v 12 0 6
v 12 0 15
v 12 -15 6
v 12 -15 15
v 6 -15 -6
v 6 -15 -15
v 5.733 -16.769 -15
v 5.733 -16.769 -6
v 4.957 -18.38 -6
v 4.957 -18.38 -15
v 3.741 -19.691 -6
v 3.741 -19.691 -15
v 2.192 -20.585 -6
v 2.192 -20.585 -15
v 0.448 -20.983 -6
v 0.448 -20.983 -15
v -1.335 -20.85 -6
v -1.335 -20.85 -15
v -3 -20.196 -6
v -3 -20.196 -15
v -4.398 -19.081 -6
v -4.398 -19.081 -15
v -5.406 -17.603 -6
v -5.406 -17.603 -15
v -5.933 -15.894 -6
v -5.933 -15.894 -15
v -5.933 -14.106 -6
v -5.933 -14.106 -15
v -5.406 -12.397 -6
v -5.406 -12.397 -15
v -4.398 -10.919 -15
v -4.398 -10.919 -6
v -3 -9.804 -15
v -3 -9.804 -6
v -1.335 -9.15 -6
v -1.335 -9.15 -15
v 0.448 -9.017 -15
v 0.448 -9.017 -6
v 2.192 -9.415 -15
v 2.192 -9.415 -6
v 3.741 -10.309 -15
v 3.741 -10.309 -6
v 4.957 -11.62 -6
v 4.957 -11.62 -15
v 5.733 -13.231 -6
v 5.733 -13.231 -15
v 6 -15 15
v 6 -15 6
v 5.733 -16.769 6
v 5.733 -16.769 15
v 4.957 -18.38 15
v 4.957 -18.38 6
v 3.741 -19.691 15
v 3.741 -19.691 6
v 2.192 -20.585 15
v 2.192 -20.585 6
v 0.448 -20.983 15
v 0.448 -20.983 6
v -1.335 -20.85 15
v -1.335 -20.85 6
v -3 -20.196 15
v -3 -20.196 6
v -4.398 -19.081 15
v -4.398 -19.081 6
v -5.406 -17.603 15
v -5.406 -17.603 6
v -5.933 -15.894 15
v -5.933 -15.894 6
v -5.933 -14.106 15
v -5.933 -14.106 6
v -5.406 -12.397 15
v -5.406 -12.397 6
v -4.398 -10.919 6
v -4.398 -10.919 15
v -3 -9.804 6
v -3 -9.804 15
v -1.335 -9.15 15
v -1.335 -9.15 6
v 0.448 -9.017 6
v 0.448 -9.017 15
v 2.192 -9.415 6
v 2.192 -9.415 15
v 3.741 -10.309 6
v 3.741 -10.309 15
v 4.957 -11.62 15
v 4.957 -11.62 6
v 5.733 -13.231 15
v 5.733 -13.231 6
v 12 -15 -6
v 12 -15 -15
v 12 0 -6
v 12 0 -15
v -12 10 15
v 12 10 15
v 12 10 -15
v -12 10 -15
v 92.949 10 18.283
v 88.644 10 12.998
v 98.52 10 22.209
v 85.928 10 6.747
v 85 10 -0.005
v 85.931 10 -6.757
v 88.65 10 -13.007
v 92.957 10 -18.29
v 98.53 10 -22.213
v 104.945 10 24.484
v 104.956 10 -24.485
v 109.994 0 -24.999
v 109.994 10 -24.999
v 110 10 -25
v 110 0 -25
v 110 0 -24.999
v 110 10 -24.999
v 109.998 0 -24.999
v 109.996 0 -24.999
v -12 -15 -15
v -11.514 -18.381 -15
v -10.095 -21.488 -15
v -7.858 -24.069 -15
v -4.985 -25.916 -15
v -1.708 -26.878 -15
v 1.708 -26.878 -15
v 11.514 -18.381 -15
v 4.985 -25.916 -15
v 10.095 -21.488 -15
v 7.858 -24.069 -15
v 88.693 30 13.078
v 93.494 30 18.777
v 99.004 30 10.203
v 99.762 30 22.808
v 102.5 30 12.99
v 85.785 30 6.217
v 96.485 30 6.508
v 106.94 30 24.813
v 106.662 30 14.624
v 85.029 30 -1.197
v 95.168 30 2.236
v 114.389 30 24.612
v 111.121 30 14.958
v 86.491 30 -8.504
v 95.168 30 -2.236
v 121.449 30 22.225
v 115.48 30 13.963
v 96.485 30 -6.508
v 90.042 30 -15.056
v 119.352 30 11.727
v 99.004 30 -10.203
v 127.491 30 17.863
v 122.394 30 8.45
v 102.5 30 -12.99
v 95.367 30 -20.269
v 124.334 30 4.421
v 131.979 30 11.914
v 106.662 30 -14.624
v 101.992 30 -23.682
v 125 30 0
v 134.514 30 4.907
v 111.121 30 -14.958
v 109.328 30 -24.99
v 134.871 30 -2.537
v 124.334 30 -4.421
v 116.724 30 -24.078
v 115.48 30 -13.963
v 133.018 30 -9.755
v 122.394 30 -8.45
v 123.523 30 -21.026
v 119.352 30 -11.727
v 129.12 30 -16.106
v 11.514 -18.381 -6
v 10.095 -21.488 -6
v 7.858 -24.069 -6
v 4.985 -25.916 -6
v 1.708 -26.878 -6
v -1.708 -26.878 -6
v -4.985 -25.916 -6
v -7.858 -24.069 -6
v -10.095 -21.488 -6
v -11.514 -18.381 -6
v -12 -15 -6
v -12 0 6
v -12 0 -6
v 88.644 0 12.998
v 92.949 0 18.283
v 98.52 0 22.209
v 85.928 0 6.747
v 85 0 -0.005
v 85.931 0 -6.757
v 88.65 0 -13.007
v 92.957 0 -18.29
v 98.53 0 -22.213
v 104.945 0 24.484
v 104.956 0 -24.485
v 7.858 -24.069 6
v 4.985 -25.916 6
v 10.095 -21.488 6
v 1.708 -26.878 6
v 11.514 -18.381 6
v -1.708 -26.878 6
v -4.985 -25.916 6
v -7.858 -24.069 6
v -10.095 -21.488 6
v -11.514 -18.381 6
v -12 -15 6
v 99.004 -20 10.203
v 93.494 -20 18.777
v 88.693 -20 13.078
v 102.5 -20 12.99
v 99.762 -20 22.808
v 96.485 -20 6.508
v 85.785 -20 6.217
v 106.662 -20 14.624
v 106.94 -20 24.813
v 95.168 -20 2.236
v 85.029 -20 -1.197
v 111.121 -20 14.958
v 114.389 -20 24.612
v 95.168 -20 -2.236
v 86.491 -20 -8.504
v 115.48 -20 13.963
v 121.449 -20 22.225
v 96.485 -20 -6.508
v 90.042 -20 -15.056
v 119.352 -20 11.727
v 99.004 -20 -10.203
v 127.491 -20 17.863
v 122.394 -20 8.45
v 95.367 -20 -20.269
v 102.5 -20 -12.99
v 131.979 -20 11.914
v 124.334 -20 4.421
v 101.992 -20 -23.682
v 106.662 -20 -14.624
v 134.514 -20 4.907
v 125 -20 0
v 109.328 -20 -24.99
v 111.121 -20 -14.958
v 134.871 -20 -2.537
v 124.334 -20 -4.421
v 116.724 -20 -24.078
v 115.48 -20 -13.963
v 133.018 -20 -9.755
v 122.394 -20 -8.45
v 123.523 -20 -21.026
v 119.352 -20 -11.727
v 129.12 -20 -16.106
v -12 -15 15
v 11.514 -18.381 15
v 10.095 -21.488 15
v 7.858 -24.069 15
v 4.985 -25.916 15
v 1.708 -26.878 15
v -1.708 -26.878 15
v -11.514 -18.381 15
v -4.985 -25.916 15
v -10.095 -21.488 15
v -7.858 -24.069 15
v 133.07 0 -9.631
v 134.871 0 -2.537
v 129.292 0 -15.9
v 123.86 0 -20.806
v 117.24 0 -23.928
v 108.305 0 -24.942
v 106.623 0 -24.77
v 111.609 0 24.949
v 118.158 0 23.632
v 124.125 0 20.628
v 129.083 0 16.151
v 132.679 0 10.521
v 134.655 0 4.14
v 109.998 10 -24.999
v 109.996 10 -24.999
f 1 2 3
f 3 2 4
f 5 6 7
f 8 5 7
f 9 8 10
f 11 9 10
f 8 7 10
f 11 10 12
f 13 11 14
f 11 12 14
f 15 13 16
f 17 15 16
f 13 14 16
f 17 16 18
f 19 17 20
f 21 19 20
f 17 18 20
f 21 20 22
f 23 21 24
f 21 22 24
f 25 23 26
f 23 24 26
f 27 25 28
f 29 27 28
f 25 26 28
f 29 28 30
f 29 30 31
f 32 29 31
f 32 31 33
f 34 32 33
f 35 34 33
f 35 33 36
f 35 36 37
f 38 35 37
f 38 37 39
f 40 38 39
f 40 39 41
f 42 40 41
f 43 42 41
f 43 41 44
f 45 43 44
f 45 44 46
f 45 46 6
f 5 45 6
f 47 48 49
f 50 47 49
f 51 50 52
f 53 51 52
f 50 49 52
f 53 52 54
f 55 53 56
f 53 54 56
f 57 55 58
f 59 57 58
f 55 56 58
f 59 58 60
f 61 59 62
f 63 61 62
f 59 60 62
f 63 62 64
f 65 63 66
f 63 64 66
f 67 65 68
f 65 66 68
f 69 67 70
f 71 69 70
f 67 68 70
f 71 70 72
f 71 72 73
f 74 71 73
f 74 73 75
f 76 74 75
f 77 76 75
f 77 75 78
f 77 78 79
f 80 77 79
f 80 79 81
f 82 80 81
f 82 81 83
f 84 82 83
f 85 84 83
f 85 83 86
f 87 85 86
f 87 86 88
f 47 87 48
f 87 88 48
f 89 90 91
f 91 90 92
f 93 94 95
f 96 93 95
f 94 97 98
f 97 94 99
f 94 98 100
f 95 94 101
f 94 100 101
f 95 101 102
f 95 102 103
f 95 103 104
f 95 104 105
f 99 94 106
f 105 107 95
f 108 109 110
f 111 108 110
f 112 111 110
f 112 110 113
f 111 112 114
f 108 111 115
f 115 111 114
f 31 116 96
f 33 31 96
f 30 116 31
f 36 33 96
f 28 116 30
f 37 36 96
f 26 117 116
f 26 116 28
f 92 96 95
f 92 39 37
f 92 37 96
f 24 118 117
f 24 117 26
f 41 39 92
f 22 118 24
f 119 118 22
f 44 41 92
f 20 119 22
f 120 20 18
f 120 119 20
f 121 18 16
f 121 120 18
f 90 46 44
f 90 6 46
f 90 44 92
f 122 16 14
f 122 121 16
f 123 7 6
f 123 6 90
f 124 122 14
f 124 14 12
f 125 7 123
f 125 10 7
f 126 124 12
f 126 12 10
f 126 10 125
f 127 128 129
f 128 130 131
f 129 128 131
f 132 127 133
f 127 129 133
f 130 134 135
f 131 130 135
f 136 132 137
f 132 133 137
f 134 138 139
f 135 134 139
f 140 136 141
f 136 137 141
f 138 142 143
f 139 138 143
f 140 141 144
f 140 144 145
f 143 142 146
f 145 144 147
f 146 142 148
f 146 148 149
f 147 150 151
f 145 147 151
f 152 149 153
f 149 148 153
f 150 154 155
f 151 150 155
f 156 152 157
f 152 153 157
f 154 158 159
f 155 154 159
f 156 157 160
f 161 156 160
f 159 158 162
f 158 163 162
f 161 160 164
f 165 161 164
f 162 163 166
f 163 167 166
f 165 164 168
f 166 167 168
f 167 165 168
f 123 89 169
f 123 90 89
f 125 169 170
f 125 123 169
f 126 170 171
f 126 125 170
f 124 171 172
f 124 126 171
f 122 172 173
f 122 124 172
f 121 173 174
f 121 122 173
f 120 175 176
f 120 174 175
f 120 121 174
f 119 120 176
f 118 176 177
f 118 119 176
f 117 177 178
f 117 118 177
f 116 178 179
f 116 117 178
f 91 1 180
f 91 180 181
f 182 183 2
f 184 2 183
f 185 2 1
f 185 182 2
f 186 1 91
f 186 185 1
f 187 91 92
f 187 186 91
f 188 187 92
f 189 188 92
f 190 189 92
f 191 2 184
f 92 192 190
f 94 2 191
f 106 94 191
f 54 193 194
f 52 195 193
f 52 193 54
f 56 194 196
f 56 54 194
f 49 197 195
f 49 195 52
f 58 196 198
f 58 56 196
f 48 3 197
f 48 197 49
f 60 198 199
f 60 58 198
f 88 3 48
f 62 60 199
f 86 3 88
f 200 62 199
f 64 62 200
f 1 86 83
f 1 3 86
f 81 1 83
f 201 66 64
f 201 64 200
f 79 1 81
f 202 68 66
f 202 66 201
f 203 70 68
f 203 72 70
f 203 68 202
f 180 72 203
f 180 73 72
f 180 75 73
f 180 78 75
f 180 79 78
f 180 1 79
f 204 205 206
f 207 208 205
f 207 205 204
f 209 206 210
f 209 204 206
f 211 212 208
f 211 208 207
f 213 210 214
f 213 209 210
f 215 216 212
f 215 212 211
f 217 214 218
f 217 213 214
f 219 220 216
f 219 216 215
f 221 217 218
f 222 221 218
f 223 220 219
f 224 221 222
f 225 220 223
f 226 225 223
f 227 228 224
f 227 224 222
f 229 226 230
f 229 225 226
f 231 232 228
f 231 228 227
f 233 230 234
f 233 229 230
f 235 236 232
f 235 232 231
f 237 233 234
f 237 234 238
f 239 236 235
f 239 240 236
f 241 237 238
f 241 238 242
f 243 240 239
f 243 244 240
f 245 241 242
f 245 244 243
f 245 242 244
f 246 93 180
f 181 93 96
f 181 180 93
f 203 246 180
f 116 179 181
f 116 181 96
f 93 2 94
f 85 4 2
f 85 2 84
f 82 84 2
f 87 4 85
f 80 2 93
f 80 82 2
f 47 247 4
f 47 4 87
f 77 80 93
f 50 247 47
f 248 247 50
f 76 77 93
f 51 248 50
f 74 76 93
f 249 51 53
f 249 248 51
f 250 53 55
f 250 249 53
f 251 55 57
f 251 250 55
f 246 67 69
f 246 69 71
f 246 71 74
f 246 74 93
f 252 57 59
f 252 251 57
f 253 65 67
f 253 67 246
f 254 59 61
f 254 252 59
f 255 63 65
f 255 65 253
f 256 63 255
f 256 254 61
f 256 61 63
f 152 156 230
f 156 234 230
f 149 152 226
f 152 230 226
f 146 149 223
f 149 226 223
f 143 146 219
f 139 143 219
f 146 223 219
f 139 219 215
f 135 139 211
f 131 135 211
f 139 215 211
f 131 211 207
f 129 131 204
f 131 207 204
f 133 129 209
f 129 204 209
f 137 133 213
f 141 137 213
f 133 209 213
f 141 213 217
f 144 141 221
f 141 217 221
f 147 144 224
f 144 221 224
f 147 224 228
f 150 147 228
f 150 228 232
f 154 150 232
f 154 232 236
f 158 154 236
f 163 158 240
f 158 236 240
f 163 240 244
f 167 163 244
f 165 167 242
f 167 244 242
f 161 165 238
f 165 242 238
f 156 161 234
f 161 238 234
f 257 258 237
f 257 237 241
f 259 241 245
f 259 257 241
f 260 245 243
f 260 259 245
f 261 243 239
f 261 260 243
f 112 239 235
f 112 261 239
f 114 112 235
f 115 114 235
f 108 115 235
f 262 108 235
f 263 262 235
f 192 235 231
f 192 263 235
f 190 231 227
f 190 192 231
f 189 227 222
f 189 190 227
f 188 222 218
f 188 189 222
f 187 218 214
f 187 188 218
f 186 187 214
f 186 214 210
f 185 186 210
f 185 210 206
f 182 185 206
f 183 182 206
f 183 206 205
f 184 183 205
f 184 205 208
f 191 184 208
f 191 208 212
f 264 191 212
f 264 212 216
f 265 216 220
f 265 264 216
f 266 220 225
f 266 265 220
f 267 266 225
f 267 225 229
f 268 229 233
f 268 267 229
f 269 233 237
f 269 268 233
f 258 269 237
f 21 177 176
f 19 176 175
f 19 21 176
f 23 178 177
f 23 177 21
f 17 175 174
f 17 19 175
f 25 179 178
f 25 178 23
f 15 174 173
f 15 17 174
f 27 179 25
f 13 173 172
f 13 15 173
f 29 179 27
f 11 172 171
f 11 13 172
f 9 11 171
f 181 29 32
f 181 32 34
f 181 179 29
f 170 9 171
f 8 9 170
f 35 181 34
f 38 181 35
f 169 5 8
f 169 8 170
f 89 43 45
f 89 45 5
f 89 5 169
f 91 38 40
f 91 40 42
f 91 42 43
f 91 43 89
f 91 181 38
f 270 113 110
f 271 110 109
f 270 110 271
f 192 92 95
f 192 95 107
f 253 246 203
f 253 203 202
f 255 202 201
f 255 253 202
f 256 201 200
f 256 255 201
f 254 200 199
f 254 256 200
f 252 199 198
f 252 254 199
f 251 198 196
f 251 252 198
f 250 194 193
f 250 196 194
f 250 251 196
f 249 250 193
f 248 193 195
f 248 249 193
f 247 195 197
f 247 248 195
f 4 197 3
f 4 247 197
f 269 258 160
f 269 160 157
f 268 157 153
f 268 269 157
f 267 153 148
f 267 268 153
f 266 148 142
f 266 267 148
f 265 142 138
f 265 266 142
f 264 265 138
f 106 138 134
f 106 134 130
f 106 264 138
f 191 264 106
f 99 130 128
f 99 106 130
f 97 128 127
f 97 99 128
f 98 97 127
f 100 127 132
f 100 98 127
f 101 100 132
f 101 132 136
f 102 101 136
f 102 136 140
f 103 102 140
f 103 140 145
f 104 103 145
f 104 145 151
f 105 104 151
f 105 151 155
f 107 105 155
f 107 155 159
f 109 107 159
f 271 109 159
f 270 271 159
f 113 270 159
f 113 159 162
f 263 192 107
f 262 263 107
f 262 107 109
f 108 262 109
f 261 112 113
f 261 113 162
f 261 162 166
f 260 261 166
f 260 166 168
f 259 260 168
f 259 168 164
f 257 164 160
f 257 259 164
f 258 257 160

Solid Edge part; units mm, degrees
sketch "Sketch1" plane through (0, 0, 0) normal (0, -1, 0) x (1, 0, 0)
  line L0 (12, 15) -> (-12, 15)
  line L1 (-12, 15) -> (-12, -15)
  line L2 (-12, -15) -> (12, -15)
  line L3 (12, -15) -> (110, -25)
  line L4 (110, 0) -> (110, -25)
  line L5 (110, 0) -> (110, 25)
  line L6 (12, 15) -> (110, 25)
extrude "Protrusion1" add sketch "Sketch1" against normal blind 10
sketch "Sketch2" plane through (0, 5, 15) normal (0, 0, 1) x (-1, 0, 0)
  line L0 (12, 20) -> (12, -5)
  line L1 (12, -5) -> (-12, -5)
  line L2 (-12, -5) -> (-12, 20)
  arc A0 (-12, 20) -> (12, 20) centre (0, 20) cw
extrude "ExtrudedProtrusion_6" add sketch "Sketch2" against normal blind 9
sketch "Sketch3" plane through (0, 5, -15) normal (0, 0, -1) x (1, 0, 0)
  line L0 (12, 20) -> (12, -5)
  line L1 (12, -5) -> (-12, -5)
  line L2 (-12, -5) -> (-12, 20)
  arc A0 (-12, 20) -> (12, 20) centre (0, 20) cw
extrude "ExtrudedProtrusion_7" add sketch "Sketch3" against normal blind 9
sketch "Sketch4" plane through (0, -8.5, -15) normal (0, 0, -1) x (1, 0, 0)
  circle A0 centre (0, 6.5) radius 6
extrude "Cutout1" cut sketch "Sketch4" against normal through all
sketch "Sketch5" plane through (49, 0, 0) normal (0, -1, 0) x (0.9948, 0, -0.1015)
  circle A0 centre (60.6849, 6.1923) radius 25
extrude "ExtrudedProtrusion_11" add sketch "Sketch5" along normal blind 20 and the other way blind 30
sketch "Sketch6" plane through (110, -20, 0) normal (0, -1, 0) x (1, 0, 0)
  circle A0 centre (0, 0) radius 15
extrude "Cutout2" cut sketch "Sketch6" against normal through all
